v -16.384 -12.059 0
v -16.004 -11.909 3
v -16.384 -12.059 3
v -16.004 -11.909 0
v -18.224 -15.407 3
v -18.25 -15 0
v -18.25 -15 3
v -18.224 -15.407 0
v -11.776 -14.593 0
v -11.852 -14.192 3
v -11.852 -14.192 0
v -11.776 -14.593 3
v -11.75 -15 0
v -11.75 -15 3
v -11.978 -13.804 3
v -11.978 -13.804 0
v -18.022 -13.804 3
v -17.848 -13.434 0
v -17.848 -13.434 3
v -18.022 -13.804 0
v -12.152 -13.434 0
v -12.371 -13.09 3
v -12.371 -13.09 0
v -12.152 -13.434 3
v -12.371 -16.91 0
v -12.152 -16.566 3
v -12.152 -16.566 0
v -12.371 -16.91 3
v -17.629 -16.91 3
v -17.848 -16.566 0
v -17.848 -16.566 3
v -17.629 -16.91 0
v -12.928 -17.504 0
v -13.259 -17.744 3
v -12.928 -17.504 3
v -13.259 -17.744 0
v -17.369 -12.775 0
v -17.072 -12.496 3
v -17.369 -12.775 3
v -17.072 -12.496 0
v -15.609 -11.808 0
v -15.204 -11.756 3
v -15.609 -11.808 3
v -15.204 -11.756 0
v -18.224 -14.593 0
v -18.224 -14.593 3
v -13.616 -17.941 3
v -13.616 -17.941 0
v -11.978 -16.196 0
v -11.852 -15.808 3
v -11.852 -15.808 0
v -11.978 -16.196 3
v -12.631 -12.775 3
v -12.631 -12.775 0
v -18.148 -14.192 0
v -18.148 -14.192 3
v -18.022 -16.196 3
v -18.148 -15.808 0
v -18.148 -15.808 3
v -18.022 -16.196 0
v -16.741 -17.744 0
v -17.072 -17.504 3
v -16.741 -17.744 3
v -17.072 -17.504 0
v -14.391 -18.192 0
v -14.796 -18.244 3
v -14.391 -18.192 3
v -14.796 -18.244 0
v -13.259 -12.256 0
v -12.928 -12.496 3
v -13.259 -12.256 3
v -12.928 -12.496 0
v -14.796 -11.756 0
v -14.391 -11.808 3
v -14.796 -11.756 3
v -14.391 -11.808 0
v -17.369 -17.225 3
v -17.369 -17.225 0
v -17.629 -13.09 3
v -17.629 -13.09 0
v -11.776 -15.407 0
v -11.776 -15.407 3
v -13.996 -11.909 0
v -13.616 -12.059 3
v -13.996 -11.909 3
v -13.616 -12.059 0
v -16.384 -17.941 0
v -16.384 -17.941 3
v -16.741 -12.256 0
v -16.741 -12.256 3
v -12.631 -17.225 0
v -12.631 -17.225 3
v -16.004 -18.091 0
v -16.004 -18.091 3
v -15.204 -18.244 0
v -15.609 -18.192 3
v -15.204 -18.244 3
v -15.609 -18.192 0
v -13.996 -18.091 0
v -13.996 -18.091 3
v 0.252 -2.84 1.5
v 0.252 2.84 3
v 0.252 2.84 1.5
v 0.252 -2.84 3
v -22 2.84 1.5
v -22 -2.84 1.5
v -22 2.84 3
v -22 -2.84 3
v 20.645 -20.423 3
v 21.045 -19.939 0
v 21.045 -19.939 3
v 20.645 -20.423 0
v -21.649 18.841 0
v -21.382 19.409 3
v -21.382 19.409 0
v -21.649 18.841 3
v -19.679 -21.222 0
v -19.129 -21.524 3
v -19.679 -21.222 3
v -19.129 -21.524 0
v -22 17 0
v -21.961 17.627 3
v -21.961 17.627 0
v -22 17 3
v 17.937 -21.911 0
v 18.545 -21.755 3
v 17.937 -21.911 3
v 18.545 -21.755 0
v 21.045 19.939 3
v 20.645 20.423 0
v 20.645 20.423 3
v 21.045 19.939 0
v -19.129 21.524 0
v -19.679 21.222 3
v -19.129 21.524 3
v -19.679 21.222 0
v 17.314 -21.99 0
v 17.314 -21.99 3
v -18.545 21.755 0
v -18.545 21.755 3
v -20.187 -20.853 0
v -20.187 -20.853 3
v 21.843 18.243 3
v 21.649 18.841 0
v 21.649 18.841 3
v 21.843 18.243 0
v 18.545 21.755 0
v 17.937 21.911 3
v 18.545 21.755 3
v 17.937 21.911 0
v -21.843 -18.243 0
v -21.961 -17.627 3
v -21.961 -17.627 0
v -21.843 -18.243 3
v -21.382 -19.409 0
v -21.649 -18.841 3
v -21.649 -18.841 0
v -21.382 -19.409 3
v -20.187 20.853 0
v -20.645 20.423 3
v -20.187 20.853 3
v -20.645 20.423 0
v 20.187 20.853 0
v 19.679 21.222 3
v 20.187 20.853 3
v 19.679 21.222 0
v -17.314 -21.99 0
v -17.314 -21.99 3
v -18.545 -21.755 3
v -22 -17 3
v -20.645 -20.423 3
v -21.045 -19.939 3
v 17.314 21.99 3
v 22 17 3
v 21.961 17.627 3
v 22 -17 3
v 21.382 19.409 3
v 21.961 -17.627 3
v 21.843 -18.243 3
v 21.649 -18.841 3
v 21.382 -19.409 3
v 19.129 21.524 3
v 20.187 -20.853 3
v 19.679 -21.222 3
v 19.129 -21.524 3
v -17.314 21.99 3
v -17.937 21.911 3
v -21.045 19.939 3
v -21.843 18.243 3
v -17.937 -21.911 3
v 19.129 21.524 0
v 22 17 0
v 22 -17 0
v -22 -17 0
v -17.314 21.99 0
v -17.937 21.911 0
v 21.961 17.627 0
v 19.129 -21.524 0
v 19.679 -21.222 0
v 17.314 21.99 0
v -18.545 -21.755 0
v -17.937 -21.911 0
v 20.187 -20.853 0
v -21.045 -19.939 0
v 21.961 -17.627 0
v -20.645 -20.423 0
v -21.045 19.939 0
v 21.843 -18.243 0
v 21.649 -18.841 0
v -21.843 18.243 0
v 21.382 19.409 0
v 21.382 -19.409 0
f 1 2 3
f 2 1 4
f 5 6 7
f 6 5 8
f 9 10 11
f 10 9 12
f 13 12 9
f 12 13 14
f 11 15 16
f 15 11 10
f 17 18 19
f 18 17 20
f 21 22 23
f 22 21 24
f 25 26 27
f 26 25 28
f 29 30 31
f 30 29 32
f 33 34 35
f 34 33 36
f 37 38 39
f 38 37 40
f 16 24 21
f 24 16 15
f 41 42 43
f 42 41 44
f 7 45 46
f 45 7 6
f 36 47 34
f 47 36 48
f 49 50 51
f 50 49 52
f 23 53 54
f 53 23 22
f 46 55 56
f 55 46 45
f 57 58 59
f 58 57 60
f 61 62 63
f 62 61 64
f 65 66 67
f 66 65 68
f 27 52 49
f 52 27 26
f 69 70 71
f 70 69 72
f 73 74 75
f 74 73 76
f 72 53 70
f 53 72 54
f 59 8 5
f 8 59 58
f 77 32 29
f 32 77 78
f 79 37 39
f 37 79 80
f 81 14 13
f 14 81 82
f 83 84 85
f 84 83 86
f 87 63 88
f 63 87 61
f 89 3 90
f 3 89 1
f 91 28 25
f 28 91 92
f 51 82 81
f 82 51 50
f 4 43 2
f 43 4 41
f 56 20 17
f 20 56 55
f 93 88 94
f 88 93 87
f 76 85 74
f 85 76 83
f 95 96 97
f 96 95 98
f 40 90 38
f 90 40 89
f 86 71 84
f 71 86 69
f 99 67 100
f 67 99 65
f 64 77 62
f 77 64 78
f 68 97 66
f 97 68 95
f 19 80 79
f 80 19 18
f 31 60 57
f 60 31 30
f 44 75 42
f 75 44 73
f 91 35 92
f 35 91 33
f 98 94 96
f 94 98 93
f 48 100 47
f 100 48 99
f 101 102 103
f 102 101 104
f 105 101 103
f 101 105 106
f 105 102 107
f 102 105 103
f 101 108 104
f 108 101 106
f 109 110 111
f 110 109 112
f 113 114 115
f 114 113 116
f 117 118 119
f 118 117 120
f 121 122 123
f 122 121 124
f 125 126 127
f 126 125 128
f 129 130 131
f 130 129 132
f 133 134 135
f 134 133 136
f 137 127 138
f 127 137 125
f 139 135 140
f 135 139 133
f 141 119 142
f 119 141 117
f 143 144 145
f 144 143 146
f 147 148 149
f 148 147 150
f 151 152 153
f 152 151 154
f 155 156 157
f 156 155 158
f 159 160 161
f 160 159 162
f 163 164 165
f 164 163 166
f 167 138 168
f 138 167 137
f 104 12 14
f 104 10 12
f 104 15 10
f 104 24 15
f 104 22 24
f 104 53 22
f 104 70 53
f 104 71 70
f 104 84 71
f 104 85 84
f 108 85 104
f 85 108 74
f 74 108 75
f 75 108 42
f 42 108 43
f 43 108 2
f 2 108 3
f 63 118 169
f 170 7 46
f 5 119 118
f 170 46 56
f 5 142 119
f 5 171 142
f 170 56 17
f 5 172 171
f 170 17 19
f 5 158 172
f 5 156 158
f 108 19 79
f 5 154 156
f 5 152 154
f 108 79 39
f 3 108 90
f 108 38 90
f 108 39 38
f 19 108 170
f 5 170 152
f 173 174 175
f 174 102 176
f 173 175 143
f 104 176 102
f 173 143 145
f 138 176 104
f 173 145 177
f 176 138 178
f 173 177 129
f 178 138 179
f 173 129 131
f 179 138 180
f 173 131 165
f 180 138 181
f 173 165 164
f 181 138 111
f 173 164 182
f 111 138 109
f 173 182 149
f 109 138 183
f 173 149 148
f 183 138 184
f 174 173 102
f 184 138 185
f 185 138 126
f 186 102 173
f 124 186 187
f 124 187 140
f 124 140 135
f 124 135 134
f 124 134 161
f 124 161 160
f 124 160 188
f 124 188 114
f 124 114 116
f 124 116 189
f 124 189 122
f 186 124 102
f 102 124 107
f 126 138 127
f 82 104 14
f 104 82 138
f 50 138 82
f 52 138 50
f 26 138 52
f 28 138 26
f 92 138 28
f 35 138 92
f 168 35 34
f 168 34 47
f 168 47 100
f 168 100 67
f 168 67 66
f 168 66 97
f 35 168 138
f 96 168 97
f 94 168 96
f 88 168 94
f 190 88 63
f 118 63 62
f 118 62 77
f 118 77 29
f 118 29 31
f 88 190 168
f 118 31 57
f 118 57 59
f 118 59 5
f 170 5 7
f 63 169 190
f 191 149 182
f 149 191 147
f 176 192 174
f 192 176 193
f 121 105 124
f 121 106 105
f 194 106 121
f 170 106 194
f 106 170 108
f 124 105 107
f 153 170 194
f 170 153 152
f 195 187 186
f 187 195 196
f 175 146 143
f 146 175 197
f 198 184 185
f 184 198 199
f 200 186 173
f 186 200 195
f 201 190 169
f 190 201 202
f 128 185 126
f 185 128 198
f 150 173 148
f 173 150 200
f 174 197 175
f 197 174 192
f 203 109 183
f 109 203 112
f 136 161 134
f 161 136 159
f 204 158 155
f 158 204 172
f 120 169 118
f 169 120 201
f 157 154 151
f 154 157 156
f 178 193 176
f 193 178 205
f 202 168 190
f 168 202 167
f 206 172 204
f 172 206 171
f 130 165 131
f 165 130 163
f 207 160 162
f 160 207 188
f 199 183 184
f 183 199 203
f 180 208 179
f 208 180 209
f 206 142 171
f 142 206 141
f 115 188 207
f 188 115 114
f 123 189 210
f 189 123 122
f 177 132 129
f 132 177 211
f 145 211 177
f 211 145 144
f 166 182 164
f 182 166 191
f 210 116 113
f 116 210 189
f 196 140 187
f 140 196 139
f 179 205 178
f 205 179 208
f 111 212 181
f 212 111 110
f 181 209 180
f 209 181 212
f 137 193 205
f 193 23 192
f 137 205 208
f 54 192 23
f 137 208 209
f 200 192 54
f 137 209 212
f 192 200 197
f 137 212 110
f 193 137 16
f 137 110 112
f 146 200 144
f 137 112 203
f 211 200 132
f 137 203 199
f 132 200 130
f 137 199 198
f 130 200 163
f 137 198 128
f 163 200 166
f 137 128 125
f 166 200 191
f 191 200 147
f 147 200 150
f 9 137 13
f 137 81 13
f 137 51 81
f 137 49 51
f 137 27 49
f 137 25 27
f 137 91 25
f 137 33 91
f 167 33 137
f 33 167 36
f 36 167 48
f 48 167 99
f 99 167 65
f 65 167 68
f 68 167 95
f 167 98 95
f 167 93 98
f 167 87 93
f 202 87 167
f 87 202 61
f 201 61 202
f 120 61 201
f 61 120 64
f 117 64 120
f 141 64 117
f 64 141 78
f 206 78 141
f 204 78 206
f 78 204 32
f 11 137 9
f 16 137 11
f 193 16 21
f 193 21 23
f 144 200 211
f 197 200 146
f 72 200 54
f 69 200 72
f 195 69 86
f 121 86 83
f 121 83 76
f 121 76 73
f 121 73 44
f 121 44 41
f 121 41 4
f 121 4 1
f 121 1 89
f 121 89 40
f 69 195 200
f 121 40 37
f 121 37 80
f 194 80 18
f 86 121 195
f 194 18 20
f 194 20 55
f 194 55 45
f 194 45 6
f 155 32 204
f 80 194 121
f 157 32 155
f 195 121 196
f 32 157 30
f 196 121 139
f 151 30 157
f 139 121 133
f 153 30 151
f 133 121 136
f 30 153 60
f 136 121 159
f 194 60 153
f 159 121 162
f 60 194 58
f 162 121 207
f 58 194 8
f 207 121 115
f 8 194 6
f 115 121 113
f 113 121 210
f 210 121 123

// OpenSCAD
$fn = 50;


difference() {
	union() {
		translate(v = [0, 0, 0]) {
			rotate(a = [0, 0, 0]) {
				hull() {
					translate(v = [-17.0000000000, 17.0000000000, 0]) {
						rotate(a = [0, 0, 0]) {
							translate(v = [0, 0, 0]) {
								rotate(a = [0, 0, 0]) {
									cylinder(h = 3, r = 5);
								}
							}
						}
					}
					translate(v = [17.0000000000, 17.0000000000, 0]) {
						rotate(a = [0, 0, 0]) {
							translate(v = [0, 0, 0]) {
								rotate(a = [0, 0, 0]) {
									cylinder(h = 3, r = 5);
								}
							}
						}
					}
					translate(v = [-17.0000000000, -17.0000000000, 0]) {
						rotate(a = [0, 0, 0]) {
							translate(v = [0, 0, 0]) {
								rotate(a = [0, 0, 0]) {
									cylinder(h = 3, r = 5);
								}
							}
						}
					}
					translate(v = [17.0000000000, -17.0000000000, 0]) {
						rotate(a = [0, 0, 0]) {
							translate(v = [0, 0, 0]) {
								rotate(a = [0, 0, 0]) {
									cylinder(h = 3, r = 5);
								}
							}
						}
					}
				}
			}
		}
	}
	union() {
		translate(v = [-15.0000000000, -15.0000000000, -125.0000000000]) {
			rotate(a = [0, 0, 0]) {
				cylinder(h = 250, r = 3.2500000000);
			}
		}
		#translate(v = [-22.6880000000, -2.8400000000, 1.5000000000]) {
			rotate(a = [0, 0, 0]) {
				cube(size = [22.9400000000, 5.6800000000, 2.7400000000]);
			}
		}
	}
}
